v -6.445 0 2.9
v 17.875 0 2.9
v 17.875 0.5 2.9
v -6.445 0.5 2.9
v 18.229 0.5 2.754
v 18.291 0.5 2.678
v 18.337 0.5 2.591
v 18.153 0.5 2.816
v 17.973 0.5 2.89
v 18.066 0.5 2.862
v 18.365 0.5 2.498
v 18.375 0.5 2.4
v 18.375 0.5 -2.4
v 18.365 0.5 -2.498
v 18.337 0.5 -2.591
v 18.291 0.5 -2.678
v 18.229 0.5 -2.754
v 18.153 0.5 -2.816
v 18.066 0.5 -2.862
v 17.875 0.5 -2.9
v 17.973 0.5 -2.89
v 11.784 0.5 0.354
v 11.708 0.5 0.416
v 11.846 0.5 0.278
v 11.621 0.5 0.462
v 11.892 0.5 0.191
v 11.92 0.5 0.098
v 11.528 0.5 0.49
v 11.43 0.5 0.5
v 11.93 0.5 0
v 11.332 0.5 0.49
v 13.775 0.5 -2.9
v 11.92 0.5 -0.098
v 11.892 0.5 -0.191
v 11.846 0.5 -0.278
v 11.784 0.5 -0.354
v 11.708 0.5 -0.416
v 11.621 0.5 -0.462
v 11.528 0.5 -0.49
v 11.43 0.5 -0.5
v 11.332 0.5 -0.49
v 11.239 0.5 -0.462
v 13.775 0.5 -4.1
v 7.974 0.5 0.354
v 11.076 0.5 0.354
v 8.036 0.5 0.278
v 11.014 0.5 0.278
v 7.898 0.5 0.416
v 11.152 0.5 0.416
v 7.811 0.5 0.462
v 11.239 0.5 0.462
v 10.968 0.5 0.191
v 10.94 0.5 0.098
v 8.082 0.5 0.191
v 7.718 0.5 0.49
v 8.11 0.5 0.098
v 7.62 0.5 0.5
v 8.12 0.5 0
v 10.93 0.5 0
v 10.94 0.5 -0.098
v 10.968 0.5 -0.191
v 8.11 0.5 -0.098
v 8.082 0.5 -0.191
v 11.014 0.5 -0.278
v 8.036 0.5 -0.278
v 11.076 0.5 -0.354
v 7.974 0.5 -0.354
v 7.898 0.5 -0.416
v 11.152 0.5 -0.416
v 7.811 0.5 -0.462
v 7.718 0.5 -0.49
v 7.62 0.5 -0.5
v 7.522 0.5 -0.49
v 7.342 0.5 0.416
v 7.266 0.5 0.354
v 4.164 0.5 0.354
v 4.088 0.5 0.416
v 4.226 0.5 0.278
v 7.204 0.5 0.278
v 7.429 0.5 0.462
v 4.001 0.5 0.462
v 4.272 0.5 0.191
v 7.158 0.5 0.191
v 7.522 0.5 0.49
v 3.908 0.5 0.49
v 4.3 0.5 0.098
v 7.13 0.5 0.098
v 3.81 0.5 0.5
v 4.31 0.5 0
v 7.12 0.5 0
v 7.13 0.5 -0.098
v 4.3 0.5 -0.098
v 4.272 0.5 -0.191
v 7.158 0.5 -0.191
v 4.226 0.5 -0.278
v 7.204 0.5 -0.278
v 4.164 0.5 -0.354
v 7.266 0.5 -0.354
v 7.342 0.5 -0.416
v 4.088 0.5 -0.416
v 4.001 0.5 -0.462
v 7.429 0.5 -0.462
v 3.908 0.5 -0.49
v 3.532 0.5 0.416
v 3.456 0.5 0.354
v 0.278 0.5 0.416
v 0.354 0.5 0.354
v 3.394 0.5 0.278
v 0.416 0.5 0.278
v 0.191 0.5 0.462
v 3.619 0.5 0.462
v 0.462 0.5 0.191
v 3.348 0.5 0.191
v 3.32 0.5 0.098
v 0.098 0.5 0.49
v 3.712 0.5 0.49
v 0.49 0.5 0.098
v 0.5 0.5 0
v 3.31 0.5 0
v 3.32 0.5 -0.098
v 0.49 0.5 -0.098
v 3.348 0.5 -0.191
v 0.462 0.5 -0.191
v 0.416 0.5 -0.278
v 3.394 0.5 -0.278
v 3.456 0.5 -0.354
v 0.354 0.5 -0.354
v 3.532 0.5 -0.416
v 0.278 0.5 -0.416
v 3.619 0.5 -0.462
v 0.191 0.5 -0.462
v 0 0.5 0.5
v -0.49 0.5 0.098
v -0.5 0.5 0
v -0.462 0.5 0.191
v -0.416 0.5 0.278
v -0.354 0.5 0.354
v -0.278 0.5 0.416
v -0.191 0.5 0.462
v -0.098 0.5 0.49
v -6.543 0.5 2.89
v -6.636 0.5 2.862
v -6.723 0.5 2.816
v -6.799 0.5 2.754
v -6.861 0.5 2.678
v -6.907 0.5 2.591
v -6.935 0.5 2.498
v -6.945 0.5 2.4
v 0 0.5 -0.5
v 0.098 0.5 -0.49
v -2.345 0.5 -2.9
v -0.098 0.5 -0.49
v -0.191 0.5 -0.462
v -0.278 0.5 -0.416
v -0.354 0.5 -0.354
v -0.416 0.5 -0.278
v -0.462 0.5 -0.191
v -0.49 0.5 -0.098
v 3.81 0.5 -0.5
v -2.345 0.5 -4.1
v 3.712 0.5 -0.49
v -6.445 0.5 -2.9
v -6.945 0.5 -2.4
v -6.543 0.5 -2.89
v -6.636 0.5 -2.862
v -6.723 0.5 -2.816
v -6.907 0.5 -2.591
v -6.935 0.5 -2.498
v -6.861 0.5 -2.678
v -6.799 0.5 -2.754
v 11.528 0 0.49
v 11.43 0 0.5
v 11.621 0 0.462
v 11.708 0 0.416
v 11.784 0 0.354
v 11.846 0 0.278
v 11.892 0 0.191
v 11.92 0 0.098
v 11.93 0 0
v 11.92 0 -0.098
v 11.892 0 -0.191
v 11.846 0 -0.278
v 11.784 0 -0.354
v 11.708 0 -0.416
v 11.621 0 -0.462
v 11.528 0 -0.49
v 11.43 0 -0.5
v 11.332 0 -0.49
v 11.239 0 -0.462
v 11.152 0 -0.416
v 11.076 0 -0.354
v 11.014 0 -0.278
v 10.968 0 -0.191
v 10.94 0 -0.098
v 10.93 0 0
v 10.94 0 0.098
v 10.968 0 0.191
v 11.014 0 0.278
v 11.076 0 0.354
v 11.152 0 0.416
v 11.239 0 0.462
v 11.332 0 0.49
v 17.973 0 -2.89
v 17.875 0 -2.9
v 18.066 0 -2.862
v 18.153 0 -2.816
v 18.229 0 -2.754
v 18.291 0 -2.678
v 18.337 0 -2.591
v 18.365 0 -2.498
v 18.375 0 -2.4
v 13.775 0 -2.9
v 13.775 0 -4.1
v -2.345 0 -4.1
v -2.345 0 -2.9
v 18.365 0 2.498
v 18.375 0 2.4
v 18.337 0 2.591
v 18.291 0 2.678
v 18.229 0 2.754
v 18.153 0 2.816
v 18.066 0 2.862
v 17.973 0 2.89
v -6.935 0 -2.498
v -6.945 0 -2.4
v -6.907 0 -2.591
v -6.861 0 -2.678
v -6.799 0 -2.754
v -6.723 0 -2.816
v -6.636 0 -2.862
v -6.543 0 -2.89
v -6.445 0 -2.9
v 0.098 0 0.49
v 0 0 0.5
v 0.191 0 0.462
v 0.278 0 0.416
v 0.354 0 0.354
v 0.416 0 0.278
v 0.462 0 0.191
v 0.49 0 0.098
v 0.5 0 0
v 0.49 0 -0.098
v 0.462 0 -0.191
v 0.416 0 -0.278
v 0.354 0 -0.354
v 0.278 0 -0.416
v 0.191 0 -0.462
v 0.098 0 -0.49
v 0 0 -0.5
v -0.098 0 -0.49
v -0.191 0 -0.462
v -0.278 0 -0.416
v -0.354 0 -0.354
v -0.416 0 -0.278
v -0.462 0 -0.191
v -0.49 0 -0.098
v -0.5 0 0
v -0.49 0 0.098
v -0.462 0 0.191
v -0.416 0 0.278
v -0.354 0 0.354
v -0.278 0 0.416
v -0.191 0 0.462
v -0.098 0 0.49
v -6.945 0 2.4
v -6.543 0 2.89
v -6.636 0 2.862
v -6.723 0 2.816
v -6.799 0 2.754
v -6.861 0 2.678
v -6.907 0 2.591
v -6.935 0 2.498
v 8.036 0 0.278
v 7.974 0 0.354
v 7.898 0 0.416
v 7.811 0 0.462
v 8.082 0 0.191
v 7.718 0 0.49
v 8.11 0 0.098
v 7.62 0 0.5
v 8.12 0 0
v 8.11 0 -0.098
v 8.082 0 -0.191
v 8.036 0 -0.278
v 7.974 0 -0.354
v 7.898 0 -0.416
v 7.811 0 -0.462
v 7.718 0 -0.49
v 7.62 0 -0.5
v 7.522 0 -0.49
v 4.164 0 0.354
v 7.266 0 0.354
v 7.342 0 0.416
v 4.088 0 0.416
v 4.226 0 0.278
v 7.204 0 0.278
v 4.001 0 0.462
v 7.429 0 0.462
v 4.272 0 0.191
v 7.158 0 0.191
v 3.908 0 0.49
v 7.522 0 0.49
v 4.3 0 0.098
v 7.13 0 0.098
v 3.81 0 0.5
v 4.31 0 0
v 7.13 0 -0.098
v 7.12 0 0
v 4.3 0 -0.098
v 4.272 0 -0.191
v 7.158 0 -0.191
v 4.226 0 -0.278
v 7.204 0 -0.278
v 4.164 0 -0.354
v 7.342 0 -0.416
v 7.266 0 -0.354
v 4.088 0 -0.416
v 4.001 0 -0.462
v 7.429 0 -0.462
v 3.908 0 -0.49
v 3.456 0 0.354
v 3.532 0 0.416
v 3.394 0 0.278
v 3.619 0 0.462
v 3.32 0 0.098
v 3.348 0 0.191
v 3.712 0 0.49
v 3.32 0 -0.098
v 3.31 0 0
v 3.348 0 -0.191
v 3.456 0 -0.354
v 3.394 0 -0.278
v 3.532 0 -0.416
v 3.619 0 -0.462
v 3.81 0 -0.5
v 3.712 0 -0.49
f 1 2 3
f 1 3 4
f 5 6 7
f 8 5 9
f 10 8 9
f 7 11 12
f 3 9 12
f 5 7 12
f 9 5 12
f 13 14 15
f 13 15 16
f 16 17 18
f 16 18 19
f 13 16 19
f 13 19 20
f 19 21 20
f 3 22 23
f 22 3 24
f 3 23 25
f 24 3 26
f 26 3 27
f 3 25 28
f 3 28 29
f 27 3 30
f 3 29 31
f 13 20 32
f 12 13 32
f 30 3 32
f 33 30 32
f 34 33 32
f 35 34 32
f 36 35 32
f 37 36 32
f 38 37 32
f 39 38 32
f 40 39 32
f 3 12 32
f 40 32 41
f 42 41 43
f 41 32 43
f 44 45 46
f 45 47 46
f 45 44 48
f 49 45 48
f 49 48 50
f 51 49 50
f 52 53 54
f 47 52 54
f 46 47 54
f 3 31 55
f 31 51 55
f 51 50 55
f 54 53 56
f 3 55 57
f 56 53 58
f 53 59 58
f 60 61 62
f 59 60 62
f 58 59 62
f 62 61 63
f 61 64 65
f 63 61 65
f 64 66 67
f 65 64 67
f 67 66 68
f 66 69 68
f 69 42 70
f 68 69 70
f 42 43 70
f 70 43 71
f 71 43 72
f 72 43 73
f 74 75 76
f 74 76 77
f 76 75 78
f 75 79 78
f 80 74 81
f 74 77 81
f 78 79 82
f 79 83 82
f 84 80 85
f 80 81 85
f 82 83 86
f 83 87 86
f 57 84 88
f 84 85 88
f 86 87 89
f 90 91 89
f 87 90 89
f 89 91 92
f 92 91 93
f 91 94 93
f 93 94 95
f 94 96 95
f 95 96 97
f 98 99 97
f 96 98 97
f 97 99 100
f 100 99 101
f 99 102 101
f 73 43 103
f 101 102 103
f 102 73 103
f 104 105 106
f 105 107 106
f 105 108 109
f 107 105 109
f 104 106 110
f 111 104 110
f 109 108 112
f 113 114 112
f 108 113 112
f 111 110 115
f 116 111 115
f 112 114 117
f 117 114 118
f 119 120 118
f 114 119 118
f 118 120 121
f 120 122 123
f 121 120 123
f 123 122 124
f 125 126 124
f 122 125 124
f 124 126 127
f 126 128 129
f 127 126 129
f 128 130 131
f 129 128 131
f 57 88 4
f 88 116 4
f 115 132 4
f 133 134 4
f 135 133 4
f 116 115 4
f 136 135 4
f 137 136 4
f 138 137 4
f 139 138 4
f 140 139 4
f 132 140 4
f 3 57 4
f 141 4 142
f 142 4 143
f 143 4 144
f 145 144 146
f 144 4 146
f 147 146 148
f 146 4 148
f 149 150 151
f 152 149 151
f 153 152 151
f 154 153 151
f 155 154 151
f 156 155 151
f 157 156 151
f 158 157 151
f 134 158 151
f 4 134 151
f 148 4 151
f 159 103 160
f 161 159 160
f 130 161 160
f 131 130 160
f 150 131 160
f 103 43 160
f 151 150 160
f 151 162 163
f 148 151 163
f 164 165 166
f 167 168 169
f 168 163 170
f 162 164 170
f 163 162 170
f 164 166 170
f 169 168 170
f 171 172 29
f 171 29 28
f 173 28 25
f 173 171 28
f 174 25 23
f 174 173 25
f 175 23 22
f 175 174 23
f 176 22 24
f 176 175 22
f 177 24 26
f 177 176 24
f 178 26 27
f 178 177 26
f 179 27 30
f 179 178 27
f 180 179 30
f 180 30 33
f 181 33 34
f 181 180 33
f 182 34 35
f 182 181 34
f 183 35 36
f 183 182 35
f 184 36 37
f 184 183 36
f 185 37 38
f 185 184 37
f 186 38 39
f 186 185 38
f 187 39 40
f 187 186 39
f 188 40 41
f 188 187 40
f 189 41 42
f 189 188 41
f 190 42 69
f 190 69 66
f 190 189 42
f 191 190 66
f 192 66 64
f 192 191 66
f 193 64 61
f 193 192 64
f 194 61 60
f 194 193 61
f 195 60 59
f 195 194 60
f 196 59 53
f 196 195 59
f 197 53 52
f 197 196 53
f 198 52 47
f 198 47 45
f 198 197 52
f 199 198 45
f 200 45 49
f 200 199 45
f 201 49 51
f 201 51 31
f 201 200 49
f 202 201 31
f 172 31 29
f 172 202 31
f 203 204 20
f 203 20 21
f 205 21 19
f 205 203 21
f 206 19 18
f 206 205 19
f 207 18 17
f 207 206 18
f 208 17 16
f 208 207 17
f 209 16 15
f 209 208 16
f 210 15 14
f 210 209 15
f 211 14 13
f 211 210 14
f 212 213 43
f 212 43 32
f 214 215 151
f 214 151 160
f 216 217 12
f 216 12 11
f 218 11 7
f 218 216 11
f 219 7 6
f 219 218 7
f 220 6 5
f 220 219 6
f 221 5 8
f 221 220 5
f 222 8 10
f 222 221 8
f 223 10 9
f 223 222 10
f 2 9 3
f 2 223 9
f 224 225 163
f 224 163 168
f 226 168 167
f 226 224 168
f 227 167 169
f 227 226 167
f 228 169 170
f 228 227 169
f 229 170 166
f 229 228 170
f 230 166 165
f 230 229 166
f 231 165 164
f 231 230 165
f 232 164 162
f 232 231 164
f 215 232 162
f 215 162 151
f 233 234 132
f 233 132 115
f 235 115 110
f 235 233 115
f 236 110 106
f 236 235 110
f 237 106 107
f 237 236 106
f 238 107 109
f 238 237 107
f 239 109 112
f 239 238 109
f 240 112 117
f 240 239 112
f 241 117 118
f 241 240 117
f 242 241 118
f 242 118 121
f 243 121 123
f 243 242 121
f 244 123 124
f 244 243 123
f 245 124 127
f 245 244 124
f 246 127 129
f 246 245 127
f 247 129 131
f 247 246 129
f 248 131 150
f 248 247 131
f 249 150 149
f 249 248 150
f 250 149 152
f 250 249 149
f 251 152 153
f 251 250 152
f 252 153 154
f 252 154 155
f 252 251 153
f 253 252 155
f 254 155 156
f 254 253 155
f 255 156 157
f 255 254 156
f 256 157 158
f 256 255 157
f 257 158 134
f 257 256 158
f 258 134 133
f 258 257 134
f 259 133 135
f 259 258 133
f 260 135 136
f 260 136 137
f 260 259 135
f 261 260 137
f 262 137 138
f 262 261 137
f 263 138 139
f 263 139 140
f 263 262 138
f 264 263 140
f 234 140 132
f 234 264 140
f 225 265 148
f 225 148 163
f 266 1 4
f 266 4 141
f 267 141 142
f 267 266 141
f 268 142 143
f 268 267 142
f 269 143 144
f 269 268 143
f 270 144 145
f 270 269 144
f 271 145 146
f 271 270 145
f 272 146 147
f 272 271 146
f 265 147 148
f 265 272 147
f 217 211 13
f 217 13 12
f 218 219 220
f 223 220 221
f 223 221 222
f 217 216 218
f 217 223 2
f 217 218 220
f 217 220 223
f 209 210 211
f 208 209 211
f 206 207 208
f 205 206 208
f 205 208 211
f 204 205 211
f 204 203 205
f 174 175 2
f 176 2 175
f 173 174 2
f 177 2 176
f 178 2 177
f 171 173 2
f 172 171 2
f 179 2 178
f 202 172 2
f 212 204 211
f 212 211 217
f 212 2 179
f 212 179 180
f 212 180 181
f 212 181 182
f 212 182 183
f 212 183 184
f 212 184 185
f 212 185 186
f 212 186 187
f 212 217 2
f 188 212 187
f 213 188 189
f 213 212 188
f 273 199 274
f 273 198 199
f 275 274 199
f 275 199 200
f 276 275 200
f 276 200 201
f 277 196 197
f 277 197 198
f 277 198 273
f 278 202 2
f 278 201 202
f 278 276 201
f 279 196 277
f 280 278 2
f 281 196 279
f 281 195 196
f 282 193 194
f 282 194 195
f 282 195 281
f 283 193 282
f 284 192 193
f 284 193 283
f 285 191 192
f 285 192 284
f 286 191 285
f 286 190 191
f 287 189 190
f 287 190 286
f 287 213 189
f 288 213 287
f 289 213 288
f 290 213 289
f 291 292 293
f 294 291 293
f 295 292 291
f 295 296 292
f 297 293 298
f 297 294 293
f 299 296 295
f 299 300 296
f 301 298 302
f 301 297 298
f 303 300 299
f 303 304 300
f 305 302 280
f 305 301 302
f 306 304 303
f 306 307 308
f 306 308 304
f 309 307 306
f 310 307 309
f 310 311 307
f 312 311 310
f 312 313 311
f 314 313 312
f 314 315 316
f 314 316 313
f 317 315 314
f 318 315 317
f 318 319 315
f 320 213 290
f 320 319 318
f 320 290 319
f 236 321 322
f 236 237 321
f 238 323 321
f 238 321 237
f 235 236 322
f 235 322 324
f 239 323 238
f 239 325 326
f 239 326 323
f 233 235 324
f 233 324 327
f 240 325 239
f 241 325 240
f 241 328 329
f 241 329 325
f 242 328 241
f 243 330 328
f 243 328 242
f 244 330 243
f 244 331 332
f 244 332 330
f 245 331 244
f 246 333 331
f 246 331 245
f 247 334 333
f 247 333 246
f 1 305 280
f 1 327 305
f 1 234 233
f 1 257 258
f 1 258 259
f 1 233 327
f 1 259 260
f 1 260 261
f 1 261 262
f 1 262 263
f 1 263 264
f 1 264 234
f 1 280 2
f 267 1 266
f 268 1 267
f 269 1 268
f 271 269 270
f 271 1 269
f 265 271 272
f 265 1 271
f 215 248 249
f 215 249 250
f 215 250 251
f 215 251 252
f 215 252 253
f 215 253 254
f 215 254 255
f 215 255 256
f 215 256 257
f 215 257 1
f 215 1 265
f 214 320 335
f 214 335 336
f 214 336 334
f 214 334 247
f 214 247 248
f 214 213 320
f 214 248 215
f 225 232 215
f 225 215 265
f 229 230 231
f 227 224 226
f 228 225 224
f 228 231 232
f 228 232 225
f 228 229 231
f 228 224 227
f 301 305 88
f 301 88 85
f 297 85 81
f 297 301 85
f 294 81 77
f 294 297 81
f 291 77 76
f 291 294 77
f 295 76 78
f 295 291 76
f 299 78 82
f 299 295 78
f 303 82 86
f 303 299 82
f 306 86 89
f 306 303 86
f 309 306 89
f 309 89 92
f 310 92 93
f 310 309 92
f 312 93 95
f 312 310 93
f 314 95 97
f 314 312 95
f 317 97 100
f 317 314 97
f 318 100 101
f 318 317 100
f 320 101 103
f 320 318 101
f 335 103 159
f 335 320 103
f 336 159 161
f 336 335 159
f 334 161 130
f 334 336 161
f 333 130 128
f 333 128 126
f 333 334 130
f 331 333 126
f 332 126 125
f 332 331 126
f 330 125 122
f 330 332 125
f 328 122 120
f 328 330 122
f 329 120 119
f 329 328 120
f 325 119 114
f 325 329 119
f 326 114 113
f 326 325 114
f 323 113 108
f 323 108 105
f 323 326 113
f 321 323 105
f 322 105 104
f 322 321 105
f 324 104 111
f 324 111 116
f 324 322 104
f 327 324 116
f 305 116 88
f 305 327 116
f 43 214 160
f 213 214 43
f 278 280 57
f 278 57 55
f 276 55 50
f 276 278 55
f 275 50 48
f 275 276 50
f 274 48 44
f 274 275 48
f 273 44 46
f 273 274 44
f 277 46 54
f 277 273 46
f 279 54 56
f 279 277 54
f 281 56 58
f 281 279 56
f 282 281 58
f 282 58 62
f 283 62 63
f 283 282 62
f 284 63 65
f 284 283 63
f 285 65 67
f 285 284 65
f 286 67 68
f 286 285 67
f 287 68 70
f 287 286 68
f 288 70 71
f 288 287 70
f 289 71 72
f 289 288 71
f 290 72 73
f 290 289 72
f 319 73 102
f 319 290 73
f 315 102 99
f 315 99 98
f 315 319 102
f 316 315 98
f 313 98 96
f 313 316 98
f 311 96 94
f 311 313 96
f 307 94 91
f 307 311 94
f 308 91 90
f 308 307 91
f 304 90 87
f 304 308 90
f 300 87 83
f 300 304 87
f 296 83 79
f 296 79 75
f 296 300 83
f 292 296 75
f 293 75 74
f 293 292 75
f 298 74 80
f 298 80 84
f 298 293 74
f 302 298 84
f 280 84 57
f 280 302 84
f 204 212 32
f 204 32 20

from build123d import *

# Parameters (mm, degrees)
SKETCH1_R           = 0.5
BOSS_EXTRUDE1_DEPTH = 0.5


with BuildPart() as part:
    # Sketch1 → Boss-Extrude1 (new body)
    with BuildSketch(Plane(origin=(0, 0, 0), x_dir=(1, 0, 0), z_dir=(0, 1, 0))):
        with BuildLine():
            Line((13.775, 2.9), (17.875, 2.9))
            ThreePointArc((17.875, 2.9), (18.228553391, 2.753553391), (18.375, 2.4))
            Line((18.375, 2.4), (18.375, -2.4))
            ThreePointArc((18.375, -2.4), (18.228553391, -2.753553391), (17.875, -2.9))
            Line((17.875, -2.9), (-6.445, -2.9))
            ThreePointArc((-6.445, -2.9), (-6.798553391, -2.753553391), (-6.945, -2.4))
            Line((-6.945, -2.4), (-6.945, 2.4))
            ThreePointArc((-6.945, 2.4), (-6.798553391, 2.753553391), (-6.445, 2.9))
            Line((-6.445, 2.9), (-2.345, 2.9))
            Line((-2.345, 2.9), (-2.345, 4.1))
            Line((-2.345, 4.1), (13.775, 4.1))
            Line((13.775, 4.1), (13.775, 2.9))
        make_face()
        with Locations(Location((0, 0, 0), (0, 0, 270))):
            Circle(SKETCH1_R, mode=Mode.SUBTRACT)
        with Locations(Location((3.81, 0, 0), (0, 0, 270))):
            Circle(SKETCH1_R, mode=Mode.SUBTRACT)
        with Locations(Location((7.62, 0, 0), (0, 0, 270))):
            Circle(SKETCH1_R, mode=Mode.SUBTRACT)
        with Locations(Location((11.43, 0, 0), (0, 0, 270))):
            Circle(SKETCH1_R, mode=Mode.SUBTRACT)
    extrude(amount=BOSS_EXTRUDE1_DEPTH)


solid = part.part
